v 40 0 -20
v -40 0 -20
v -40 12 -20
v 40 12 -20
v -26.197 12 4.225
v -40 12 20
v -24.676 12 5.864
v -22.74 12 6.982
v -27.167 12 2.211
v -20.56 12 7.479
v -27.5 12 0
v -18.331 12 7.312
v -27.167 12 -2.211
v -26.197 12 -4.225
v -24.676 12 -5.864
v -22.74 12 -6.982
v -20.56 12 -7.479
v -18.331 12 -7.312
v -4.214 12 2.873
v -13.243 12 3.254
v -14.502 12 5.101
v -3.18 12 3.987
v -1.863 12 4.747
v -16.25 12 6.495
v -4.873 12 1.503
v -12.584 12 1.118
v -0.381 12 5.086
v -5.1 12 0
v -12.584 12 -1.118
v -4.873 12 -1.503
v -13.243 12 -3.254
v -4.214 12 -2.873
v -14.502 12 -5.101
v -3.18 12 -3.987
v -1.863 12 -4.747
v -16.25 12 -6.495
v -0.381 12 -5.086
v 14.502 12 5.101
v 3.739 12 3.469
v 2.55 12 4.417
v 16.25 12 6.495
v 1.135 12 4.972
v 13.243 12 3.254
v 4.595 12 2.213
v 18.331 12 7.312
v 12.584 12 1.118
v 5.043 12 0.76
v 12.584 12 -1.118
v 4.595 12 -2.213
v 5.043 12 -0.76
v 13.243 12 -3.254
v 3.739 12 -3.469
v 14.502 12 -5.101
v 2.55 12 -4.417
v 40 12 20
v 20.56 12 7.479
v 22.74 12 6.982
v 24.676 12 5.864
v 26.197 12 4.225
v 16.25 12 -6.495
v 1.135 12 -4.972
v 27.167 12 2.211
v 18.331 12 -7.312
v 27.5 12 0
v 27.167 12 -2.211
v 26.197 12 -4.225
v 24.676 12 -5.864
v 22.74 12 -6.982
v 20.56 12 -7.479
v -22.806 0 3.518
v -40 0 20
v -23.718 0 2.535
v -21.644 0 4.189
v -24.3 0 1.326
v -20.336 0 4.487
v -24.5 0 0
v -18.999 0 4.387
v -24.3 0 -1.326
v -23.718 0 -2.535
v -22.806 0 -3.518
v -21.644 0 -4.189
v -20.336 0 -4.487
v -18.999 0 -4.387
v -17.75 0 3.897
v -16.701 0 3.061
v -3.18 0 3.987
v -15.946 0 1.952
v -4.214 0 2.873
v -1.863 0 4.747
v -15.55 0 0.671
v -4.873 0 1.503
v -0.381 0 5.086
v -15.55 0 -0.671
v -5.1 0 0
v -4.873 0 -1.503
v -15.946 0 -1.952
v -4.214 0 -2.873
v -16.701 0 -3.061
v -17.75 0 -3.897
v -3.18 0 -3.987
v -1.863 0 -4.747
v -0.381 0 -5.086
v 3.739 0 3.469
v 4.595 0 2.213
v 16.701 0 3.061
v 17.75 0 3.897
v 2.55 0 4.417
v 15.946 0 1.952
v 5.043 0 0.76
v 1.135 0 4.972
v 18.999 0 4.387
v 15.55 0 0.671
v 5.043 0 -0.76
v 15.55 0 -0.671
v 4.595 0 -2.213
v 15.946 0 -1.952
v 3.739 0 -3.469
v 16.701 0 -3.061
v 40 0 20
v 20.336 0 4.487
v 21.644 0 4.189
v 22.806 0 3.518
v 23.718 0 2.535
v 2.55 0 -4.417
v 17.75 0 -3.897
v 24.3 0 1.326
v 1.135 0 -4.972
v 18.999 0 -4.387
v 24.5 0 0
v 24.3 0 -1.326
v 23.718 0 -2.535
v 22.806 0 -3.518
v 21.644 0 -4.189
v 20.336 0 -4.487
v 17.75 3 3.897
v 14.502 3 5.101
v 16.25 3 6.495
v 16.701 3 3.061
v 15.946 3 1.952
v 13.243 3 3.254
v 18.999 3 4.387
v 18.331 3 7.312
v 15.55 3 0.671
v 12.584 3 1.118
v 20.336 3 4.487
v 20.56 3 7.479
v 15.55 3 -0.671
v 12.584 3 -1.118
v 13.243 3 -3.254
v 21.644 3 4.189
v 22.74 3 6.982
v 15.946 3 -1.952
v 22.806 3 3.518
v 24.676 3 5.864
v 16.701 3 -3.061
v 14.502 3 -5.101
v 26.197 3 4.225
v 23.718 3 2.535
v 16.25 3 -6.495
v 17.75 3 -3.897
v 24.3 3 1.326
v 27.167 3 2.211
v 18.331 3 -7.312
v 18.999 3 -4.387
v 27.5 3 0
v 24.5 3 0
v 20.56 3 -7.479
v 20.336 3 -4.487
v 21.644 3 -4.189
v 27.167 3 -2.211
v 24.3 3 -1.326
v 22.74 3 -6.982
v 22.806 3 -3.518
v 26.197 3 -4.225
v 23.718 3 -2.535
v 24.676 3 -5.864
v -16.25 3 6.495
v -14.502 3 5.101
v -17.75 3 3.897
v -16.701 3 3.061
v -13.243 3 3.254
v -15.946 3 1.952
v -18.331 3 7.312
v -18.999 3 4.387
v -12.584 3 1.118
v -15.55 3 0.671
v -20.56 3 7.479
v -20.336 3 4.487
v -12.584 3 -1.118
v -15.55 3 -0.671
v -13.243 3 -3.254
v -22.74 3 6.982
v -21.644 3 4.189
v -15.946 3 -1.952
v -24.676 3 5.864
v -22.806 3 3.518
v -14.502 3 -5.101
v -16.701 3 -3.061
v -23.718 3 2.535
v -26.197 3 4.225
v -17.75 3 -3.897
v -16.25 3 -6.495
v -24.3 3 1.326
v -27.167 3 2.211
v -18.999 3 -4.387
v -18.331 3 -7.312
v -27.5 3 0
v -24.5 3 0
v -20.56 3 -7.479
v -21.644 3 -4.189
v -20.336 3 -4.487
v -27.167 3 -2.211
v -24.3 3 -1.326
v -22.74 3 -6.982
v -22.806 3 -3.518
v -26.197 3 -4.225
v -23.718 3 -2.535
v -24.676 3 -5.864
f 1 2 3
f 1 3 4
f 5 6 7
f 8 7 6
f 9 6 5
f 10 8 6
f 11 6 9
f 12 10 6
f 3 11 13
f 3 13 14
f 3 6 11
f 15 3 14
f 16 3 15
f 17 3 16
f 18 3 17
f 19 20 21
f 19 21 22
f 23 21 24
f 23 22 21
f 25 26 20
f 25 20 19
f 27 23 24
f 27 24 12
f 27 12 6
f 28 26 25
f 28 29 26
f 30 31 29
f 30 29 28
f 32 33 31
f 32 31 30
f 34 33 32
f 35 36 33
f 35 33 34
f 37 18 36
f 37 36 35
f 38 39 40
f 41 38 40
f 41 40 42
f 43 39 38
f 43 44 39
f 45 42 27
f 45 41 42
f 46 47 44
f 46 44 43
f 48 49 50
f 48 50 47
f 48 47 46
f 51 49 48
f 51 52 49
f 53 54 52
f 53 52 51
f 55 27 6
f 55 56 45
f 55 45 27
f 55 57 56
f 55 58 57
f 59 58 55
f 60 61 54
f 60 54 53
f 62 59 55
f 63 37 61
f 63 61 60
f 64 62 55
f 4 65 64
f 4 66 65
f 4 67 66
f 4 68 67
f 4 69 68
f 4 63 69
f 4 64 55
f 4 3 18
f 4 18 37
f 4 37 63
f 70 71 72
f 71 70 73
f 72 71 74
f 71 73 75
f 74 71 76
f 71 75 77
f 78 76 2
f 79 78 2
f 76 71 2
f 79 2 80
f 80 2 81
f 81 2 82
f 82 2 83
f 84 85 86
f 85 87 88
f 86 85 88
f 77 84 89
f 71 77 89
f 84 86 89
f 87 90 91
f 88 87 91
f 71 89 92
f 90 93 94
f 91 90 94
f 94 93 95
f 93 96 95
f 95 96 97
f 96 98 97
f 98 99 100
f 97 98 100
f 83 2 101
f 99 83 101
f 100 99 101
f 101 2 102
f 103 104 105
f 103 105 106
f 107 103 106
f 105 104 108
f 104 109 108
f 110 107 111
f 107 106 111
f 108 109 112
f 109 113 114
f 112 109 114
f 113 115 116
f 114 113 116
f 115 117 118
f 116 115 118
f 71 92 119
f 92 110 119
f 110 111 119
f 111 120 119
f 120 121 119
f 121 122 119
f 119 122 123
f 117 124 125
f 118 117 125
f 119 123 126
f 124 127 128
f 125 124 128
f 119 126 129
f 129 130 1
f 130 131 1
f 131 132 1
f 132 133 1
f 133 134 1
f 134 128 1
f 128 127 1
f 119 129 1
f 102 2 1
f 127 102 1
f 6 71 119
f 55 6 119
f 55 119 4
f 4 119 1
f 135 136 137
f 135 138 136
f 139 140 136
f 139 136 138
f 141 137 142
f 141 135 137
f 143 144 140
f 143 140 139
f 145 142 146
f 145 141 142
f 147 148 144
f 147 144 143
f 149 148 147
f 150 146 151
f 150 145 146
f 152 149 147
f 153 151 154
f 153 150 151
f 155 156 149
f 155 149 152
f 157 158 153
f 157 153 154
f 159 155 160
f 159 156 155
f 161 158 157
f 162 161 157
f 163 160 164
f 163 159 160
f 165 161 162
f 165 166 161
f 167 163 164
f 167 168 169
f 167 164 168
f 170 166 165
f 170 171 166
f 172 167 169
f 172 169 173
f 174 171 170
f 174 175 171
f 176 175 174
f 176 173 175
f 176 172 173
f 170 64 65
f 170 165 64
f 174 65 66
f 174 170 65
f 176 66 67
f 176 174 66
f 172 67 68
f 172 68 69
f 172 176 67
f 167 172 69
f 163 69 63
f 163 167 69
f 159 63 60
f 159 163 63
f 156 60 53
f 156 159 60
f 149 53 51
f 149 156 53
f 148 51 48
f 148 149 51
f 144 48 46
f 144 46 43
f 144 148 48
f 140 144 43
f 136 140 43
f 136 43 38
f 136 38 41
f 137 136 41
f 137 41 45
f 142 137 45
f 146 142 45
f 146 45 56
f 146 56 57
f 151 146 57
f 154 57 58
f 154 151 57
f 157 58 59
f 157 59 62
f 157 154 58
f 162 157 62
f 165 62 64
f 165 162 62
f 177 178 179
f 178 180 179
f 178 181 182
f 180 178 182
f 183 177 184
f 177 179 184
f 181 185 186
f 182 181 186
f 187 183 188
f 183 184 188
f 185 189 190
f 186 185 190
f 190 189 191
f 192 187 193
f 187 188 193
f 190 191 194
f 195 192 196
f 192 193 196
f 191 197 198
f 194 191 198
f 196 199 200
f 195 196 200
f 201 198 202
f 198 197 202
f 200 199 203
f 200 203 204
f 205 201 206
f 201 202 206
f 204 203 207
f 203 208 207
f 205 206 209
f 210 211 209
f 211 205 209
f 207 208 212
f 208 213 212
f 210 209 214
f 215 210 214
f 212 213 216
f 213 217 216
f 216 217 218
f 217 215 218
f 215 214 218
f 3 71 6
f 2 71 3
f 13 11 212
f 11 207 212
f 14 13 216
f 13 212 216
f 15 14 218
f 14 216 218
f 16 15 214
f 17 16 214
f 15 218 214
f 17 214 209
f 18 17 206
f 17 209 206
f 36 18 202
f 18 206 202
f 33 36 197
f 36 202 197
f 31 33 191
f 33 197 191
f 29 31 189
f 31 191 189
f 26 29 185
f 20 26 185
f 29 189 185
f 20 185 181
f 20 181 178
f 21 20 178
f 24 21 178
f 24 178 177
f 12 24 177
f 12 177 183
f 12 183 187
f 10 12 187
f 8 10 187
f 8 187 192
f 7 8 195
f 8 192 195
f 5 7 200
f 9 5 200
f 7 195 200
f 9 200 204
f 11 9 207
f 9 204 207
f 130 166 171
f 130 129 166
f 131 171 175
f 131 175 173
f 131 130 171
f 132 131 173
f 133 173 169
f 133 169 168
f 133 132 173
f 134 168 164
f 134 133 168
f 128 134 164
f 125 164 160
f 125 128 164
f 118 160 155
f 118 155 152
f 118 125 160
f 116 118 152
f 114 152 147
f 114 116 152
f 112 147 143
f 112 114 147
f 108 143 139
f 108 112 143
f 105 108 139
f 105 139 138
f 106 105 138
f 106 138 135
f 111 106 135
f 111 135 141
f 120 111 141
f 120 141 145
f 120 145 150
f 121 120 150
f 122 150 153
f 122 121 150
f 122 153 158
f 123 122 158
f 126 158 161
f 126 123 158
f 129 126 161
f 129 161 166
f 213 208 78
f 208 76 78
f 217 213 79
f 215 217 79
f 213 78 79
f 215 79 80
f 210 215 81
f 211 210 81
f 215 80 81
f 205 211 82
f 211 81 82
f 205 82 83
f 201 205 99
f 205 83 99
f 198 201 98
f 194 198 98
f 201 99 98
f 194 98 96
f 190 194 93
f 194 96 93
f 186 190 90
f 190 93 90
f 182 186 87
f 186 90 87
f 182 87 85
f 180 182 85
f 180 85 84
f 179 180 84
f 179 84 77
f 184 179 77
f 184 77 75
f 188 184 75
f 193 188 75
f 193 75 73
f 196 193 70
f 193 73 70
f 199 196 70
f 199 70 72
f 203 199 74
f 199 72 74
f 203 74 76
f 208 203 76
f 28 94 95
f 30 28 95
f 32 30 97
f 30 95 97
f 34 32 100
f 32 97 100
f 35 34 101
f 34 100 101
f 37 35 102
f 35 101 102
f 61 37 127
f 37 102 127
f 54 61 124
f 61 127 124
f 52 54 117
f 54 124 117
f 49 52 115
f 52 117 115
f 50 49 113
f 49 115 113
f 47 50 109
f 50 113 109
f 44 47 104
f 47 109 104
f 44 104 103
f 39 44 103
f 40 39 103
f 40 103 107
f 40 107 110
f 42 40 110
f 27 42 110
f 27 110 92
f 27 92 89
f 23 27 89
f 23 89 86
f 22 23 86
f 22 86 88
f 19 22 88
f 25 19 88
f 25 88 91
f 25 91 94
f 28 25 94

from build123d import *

# Parameters (mm, degrees)
SKETCH_1_W             = 80
SKETCH_1_H             = 40
EXTRUDE_1_DEPTH        = 12
HOLE_WIZARD_M121_D     = 10.2
HOLE_WIZARD_M121_DEPTH = 12


with BuildPart() as part:
    # Эскиз1 → Бобышка-Вытянуть1 (new body)
    with BuildSketch(Plane(origin=(0, 0, 0), x_dir=(1, 0, 0), z_dir=(0, 1, 0))):
        Rectangle(SKETCH_1_W, SKETCH_1_H)
    extrude(amount=EXTRUDE_1_DEPTH)

    # Эскиз2 → Вырез-Повернуть1 (revolve, cut)
    with BuildSketch(Plane.XY):
        Polygon((-27.5, 12), (-27.5, 3), (-24.5, 3), (-24.5, 0), (-20, 0), (-20, 12), align=None)
    cut_revolve_1 = revolve(axis=Axis((-20, 12, 0), (0, -1, 0)), mode=Mode.SUBTRACT)

    # Зеркальное отражение1: Вырез-Повернуть1 across plane
    add(cut_revolve_1.mirror(Plane(origin=(0, 0, 0), x_dir=(0, 0, 1), z_dir=(1, 0, 0))), mode=Mode.SUBTRACT)

    # Отверстие обработанное метчиком M121
    with Locations(Plane(origin=(0, 12, 0), x_dir=(1, 0, 0), z_dir=(0, 1, 0))):
        with Locations((0, 0)):
            Hole(HOLE_WIZARD_M121_D / 2, depth=HOLE_WIZARD_M121_DEPTH)


solid = part.part
